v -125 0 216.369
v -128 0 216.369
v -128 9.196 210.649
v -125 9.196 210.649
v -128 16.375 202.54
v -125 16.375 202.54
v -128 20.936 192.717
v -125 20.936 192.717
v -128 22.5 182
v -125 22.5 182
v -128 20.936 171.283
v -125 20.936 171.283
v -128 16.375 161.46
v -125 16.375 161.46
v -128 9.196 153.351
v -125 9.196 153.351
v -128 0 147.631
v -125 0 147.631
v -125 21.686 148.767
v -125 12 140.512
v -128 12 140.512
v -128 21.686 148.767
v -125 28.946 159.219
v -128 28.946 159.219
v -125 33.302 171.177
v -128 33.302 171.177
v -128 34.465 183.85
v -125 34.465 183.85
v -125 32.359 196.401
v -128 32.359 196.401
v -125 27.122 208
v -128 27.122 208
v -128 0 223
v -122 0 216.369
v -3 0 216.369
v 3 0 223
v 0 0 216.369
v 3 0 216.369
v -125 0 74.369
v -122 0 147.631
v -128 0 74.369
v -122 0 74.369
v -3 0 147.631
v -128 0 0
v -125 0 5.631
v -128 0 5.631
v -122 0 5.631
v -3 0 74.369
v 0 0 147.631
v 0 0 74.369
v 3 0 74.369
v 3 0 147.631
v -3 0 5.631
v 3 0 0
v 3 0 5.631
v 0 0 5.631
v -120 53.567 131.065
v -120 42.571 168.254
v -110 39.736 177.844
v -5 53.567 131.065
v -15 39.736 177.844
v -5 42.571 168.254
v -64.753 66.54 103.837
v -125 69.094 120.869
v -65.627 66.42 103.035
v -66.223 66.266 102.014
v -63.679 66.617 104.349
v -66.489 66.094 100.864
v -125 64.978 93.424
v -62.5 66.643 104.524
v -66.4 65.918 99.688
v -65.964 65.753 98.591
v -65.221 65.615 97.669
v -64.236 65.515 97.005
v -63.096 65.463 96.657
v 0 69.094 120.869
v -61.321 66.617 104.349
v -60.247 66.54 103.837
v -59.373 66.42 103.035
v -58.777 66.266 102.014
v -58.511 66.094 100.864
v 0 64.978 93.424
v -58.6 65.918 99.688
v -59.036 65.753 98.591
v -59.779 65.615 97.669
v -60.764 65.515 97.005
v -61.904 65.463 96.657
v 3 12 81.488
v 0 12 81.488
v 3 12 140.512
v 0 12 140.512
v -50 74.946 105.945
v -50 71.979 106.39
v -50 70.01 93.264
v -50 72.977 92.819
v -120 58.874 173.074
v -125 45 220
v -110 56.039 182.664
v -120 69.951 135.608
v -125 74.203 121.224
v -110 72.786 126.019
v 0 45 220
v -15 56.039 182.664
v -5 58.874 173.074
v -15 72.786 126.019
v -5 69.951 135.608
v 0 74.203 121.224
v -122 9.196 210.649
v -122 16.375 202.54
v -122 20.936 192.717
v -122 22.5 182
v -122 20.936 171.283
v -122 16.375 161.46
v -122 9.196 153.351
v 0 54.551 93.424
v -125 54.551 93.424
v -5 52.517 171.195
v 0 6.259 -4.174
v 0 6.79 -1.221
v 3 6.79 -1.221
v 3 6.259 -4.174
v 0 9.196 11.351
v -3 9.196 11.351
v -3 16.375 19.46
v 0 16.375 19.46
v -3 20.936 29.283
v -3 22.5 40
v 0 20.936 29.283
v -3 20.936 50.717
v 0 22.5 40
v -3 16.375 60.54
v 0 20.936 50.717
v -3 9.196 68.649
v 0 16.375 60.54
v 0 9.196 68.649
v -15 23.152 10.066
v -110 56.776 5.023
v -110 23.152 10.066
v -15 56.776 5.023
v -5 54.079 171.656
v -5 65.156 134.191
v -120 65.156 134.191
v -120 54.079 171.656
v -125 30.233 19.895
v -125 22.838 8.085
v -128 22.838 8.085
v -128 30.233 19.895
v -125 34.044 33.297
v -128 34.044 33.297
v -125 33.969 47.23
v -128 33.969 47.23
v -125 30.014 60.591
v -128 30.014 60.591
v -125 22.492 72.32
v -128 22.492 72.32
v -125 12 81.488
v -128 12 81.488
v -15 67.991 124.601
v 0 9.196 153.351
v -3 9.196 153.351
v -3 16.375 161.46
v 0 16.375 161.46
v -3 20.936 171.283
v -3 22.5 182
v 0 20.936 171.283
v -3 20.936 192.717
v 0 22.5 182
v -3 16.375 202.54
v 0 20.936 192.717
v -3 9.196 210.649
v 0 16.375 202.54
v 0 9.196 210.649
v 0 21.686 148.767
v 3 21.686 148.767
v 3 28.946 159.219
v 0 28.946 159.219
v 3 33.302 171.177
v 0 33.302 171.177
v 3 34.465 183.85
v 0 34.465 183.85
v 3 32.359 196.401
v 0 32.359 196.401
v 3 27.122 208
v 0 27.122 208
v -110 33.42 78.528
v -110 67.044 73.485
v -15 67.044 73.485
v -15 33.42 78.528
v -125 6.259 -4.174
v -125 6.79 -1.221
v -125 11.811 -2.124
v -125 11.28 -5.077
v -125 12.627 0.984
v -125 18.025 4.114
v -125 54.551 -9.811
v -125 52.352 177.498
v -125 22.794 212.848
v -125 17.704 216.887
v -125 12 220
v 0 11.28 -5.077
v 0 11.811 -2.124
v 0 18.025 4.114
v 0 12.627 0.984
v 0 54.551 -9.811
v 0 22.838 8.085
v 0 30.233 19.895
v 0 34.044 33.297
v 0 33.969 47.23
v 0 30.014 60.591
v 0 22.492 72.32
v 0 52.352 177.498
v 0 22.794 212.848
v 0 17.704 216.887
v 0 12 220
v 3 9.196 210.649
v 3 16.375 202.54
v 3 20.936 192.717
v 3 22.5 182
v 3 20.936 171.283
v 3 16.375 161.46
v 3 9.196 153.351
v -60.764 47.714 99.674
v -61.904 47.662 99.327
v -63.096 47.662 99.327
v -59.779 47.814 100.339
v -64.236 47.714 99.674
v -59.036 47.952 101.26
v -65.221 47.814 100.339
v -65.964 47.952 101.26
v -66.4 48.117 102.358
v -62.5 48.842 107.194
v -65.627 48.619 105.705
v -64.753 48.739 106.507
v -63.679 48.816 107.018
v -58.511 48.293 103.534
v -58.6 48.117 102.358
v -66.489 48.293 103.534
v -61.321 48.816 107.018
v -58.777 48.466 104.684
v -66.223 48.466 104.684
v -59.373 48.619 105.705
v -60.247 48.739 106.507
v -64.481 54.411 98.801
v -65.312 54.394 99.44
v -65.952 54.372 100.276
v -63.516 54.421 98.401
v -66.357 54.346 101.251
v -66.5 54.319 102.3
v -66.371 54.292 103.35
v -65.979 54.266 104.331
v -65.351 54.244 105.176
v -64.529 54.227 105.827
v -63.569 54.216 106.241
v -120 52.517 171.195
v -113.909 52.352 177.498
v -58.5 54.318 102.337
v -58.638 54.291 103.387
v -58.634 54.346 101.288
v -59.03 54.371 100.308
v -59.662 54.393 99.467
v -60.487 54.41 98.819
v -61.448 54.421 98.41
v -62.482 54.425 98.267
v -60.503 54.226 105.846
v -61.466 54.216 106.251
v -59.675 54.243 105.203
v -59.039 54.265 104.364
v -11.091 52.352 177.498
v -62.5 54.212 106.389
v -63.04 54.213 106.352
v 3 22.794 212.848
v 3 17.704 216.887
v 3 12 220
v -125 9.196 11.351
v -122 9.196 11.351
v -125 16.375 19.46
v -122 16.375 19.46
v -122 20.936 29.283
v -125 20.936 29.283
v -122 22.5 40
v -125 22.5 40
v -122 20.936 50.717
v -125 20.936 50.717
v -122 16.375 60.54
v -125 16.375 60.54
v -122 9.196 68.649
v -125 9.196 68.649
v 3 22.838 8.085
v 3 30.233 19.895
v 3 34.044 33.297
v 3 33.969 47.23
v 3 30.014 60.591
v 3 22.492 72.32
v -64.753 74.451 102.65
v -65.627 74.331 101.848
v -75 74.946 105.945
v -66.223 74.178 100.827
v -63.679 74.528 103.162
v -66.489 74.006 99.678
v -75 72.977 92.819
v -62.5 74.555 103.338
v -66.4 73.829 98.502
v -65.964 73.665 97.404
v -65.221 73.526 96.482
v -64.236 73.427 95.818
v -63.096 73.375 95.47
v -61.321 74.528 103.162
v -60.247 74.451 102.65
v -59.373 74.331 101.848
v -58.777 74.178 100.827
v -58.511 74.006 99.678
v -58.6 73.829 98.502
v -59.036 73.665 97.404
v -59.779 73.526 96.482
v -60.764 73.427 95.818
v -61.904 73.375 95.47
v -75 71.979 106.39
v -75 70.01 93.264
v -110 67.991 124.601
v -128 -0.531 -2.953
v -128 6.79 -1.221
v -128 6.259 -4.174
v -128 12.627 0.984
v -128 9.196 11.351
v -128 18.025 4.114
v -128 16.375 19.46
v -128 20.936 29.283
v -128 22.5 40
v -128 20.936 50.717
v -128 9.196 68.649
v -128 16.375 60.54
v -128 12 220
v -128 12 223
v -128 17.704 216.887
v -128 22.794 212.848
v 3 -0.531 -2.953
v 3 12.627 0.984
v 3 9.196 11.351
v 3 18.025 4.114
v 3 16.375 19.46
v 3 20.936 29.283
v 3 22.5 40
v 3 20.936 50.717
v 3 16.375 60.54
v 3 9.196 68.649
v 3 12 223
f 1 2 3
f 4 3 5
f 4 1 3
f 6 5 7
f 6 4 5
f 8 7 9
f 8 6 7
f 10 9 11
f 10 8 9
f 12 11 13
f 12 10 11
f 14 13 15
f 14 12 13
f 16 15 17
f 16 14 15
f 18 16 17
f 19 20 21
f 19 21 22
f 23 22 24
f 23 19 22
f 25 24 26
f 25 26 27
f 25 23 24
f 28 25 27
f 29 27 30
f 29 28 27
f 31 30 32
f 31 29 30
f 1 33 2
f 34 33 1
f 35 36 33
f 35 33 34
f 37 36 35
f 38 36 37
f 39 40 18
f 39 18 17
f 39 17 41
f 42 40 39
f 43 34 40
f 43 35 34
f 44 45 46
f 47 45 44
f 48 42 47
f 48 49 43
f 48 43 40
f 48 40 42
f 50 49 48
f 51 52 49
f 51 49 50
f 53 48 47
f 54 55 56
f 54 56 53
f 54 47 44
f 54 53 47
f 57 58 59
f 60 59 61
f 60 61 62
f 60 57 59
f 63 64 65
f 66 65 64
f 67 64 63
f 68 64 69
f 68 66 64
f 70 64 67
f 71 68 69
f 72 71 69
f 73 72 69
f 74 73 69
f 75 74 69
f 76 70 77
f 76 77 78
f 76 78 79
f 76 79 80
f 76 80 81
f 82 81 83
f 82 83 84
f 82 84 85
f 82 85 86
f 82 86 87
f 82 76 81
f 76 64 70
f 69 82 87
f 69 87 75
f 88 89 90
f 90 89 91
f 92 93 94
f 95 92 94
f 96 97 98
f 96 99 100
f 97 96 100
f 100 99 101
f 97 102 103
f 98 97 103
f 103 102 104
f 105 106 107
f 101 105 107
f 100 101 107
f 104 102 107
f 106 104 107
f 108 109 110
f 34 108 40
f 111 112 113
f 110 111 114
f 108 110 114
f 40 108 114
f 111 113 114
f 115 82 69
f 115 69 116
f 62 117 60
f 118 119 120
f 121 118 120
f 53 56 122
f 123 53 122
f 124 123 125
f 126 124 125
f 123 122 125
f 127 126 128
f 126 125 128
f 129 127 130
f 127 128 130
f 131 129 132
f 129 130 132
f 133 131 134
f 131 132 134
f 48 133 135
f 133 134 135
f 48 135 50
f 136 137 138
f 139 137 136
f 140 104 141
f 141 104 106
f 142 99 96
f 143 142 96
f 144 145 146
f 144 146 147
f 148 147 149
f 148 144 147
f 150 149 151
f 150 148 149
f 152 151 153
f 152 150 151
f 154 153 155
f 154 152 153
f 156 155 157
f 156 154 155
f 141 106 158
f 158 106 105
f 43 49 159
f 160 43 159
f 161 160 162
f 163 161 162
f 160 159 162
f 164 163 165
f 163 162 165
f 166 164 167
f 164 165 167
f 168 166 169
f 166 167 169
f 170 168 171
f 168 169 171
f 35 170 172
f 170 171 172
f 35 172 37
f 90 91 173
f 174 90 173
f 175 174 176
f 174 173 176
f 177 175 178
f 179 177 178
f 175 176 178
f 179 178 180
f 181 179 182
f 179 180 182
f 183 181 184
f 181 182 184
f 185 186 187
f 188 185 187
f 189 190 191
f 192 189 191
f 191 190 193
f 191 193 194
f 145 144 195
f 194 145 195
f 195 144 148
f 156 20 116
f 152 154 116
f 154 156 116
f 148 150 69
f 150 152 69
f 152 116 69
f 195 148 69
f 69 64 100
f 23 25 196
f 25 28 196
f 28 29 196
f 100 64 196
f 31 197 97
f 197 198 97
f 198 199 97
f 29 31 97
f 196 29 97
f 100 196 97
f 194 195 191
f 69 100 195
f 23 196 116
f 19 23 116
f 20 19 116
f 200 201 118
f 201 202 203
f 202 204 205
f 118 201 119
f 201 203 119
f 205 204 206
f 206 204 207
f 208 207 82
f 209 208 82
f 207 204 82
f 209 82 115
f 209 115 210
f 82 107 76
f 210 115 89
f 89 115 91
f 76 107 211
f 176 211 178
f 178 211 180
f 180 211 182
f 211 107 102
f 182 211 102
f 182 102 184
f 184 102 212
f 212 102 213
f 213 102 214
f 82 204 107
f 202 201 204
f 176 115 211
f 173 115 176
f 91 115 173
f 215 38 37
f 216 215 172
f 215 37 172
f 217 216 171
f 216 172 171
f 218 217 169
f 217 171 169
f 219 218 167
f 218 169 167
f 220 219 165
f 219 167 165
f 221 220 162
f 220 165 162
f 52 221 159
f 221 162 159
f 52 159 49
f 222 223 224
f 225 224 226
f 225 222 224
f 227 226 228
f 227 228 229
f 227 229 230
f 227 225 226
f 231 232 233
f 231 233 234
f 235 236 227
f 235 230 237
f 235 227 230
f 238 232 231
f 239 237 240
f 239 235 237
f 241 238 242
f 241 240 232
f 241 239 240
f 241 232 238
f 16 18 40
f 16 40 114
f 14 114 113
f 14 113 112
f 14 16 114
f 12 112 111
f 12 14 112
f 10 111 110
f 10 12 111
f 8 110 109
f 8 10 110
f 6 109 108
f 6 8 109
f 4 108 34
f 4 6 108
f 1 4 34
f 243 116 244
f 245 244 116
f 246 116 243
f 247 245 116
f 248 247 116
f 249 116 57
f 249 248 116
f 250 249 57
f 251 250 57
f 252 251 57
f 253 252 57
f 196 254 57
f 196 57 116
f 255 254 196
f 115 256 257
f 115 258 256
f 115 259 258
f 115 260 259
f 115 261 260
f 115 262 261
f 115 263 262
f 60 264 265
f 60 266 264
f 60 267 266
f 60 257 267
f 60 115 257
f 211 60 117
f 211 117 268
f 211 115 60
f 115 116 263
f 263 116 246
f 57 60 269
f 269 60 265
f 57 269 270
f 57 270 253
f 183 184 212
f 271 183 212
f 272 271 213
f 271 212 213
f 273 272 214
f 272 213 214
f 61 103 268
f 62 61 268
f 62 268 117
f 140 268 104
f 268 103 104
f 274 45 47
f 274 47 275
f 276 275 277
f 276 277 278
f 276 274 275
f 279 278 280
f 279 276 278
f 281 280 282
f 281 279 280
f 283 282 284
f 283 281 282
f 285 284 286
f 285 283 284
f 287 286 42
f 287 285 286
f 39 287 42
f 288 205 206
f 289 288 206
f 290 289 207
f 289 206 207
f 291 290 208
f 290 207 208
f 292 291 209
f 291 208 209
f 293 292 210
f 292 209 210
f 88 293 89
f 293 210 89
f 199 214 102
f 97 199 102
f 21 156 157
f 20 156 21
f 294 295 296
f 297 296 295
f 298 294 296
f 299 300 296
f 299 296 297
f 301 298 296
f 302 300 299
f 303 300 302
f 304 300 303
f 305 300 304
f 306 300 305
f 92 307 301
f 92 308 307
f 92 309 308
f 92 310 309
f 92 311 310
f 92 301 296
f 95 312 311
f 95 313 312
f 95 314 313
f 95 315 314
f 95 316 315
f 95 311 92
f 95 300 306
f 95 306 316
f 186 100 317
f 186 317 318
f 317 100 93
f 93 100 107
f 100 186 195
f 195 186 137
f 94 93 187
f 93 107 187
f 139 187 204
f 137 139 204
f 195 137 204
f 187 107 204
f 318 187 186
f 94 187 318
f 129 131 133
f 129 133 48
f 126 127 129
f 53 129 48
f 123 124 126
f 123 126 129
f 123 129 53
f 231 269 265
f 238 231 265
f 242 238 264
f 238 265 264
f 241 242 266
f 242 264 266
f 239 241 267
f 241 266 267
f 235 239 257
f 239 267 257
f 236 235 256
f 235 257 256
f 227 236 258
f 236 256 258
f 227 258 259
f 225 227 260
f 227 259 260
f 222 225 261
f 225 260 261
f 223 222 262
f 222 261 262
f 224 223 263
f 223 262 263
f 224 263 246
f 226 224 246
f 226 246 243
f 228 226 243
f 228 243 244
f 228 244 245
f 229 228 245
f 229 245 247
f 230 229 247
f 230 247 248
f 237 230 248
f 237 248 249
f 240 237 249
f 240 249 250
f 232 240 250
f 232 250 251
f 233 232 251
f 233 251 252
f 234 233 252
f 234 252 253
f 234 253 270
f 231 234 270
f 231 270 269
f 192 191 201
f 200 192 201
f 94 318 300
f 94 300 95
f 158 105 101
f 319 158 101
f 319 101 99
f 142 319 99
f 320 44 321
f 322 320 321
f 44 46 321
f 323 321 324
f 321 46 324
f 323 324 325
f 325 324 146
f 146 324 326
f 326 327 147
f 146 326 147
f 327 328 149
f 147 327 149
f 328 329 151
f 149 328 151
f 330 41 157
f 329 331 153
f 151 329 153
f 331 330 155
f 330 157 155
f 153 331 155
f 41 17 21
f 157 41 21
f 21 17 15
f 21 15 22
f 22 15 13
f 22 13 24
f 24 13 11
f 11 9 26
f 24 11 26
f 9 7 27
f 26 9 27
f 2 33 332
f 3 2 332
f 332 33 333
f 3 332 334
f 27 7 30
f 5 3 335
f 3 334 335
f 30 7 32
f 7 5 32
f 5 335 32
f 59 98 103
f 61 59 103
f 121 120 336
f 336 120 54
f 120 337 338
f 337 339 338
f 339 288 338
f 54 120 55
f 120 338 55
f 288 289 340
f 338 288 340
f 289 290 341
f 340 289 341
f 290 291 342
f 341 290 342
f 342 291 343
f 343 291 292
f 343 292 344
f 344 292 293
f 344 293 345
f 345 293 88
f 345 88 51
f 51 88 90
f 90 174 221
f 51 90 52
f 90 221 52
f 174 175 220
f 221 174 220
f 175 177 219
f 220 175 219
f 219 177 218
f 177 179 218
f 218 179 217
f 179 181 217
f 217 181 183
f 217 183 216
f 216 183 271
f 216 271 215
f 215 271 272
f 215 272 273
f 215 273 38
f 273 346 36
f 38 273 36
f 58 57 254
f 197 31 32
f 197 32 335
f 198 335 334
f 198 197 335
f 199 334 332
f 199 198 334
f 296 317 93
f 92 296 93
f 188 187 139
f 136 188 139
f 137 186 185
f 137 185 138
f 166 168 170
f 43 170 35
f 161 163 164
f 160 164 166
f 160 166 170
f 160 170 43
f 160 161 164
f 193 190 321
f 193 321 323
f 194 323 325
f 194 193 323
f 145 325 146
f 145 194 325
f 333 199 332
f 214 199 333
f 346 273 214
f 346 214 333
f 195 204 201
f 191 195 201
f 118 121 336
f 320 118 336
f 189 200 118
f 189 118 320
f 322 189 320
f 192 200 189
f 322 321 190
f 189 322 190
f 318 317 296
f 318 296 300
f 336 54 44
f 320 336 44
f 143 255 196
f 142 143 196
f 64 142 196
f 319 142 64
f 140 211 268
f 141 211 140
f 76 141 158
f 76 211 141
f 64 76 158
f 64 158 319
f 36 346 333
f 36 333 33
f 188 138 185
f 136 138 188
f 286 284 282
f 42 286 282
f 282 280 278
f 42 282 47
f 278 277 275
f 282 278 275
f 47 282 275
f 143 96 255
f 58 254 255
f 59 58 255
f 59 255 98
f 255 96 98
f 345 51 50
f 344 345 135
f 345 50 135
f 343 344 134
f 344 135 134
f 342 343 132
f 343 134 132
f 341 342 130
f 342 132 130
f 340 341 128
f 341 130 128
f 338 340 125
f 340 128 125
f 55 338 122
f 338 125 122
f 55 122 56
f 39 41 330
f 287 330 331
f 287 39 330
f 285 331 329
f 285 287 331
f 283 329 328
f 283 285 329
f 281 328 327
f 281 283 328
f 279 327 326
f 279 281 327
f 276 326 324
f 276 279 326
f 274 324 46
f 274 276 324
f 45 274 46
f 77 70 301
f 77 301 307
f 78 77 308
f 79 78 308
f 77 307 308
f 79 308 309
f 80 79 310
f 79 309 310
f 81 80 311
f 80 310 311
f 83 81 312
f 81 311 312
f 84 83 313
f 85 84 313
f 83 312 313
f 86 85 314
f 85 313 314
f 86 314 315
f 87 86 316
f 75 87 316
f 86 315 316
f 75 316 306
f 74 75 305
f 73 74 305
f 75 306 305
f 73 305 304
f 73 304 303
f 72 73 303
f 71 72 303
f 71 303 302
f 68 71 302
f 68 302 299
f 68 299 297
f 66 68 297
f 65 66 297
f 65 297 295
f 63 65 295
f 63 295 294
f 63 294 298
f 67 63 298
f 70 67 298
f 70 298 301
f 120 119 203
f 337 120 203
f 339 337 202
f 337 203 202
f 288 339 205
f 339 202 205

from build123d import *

# Parameters (mm, degrees)
BOSS_EXTRUDE1_DEPTH = 125
CUT_EXTRUDE1_DEPTH  = 17
SKETCH3_W           = 95
SKETCH3_H           = 69.22757419
CUT_EXTRUDE2_DEPTH  = 34
SKETCH4_W           = 25
SKETCH4_H           = 13.27242581
BOSS_EXTRUDE2_DEPTH = 3
SKETCH5_R           = 4
CUT_EXTRUDE3_DEPTH  = 26
SKETCH6_R           = 37.5
CUT_EXTRUDE4_DEPTH  = 3
BOSS_EXTRUDE3_DEPTH = 3
BOSS_EXTRUDE4_DEPTH = 3
BOSS_EXTRUDE5_DEPTH = 3


with BuildPart() as part:
    # Sketch1 → Boss-Extrude1 (new body)
    with BuildSketch(Plane(origin=(0, 0, 0), x_dir=(0, 0, -1), z_dir=(1, 0, 0))):
        Polygon((0, 0), (-220, 0), (-220, 45), (-121.223885949, 74.203491429), (9.810612088, 54.551256842), align=None)
        Polygon((-177.49762675, 52.35202023), (-120.869266543, 69.094386012), (-93.423815393, 64.978184153), (-93.423815393, 54.551256842), align=None, mode=Mode.SUBTRACT)
    extrude(amount=-BOSS_EXTRUDE1_DEPTH)

    # Sketch2 → Cut-Extrude1 (cut)
    with BuildSketch(Plane(origin=(0, 101.19793775, 29.919511777), x_dir=(1, 0, 0), z_dir=(0, 0.9589658804644564, 0.28352149848826236))):
        Polygon((-110, -159.280040992), (-15, -159.280040992), (-5, -149.280040992), (-5, -110.211285439), (-15, -100.211285439), (-110, -100.211285439), (-120, -110.211285439), (-120, -149.280040992), align=None)
    extrude(amount=-CUT_EXTRUDE1_DEPTH, mode=Mode.SUBTRACT)

    # Sketch3 → Cut-Extrude2 (cut)
    with BuildSketch(Plane(origin=(0, 54.790217418, -8.217303244), x_dir=(1, 0, 0), z_dir=(0, 0.9889396078246219, -0.1483187515983168))):
        with Locations((-62.5, -48.002658537)):
            Rectangle(SKETCH3_W, SKETCH3_H)
    extrude(amount=-CUT_EXTRUDE2_DEPTH, mode=Mode.SUBTRACT)

    # Sketch4 → Boss-Extrude2 (add)
    with BuildSketch(Plane(origin=(0, 54.790217418, -8.217303244), x_dir=(1, 0, 0), z_dir=(0, 0.9889396078246219, -0.1483187515983168))):
        with Locations((-62.5, -109.252658537)):
            Rectangle(SKETCH4_W, SKETCH4_H)
    extrude(amount=BOSS_EXTRUDE2_DEPTH)

    # Sketch5 → Cut-Extrude3 (cut)
    with BuildSketch(Plane(origin=(0, 57.757036242, -8.662259499), x_dir=(1, 0, 0), z_dir=(0, 0.988939607824622, -0.1483187515983164))):
        with Locations(Location((-62.5, -109.252658537, 0), (0, 0, 270))):
            Circle(SKETCH5_R)
    extrude(amount=-CUT_EXTRUDE3_DEPTH, mode=Mode.SUBTRACT)

    # Sketch6 → Cut-Extrude4 (cut)
    with BuildSketch(Plane(origin=(0, 0, 0), x_dir=(0, 0, -1), z_dir=(1, 0, 0))):
        with Locations((-182, -15)):
            Circle(SKETCH6_R)
        with Locations((-40, -15)):
            Circle(SKETCH6_R)
    cut_extrude4 = extrude(amount=-CUT_EXTRUDE4_DEPTH, mode=Mode.SUBTRACT)

    # Mirror1: Cut-Extrude4 across plane
    add(cut_extrude4.mirror(Plane(origin=(-62.5, 0, 0), x_dir=(0, 0, 1), z_dir=(1, 0, 0))), mode=Mode.SUBTRACT)

    # Sketch7 → Boss-Extrude3 (add)
    with BuildSketch(Plane.XY.offset(220)):
        Polygon((-113, 12), (-125, 12), (-125, 0), (0, 0), (0, 12), (-12, 12), align=None)
    extrude(amount=BOSS_EXTRUDE3_DEPTH)

    # Sketch8 → Boss-Extrude4 (add)
    with BuildSketch(Plane(origin=(0, 0, 0), x_dir=(0, 0, -1), z_dir=(1, 0, 0))):
        with BuildLine():
            Line((-81.487950058, 12), (-140.512049942, 12))
            ThreePointArc((-140.512049942, 12), (-171.177028416, 33.302311395), (-208, 27.121847063))
            ThreePointArc((-208, 27.121847063), (-214.976280656, 20.335654808), (-220, 12))
            Line((-220, 12), (-223, 12))
            Line((-223, 12), (-223, 0))
            Line((-223, 0), (-216.369317712, 0))
            ThreePointArc((-216.369317712, 0), (-182, 22.5), (-147.630682288, 0))
            Line((-147.630682288, 0), (-74.369317712, 0))
            ThreePointArc((-74.369317712, 0), (-40, 22.5), (-5.630682288, 0))
            Line((-5.630682288, 0), (0, 0))
            Line((0, 0), (1.221081194, 6.789740871))
            ThreePointArc((1.221081194, 6.789740871), (-2.437755356, 15.390427261), (-8.085309053, 22.837844835))
            ThreePointArc((-8.085309053, 22.837844835), (-47.230251909, 33.969107173), (-81.487950058, 12))
        make_face()
    boss_extrude4 = extrude(amount=BOSS_EXTRUDE4_DEPTH)

    # Mirror2: Boss-Extrude4 across plane
    add(boss_extrude4.mirror(Plane(origin=(-62.5, 0, 0), x_dir=(0, 0, 1), z_dir=(1, 0, 0))))

    # Sketch9 → Boss-Extrude5 (add)
    with BuildSketch(Plane(origin=(0, 0, 0), x_dir=(-1, 0, 0), z_dir=(0, -0.17700245783771668, -0.9842104093736296))):
        Polygon((12, 12), (0, 12), (0, 6.898668015), (-3, 6.898668015), (-3, 0), (128, 0), (128, 6.898668015), (125, 6.898668015), (125, 12), (113, 12), align=None)
    extrude(amount=BOSS_EXTRUDE5_DEPTH)


solid = part.part
